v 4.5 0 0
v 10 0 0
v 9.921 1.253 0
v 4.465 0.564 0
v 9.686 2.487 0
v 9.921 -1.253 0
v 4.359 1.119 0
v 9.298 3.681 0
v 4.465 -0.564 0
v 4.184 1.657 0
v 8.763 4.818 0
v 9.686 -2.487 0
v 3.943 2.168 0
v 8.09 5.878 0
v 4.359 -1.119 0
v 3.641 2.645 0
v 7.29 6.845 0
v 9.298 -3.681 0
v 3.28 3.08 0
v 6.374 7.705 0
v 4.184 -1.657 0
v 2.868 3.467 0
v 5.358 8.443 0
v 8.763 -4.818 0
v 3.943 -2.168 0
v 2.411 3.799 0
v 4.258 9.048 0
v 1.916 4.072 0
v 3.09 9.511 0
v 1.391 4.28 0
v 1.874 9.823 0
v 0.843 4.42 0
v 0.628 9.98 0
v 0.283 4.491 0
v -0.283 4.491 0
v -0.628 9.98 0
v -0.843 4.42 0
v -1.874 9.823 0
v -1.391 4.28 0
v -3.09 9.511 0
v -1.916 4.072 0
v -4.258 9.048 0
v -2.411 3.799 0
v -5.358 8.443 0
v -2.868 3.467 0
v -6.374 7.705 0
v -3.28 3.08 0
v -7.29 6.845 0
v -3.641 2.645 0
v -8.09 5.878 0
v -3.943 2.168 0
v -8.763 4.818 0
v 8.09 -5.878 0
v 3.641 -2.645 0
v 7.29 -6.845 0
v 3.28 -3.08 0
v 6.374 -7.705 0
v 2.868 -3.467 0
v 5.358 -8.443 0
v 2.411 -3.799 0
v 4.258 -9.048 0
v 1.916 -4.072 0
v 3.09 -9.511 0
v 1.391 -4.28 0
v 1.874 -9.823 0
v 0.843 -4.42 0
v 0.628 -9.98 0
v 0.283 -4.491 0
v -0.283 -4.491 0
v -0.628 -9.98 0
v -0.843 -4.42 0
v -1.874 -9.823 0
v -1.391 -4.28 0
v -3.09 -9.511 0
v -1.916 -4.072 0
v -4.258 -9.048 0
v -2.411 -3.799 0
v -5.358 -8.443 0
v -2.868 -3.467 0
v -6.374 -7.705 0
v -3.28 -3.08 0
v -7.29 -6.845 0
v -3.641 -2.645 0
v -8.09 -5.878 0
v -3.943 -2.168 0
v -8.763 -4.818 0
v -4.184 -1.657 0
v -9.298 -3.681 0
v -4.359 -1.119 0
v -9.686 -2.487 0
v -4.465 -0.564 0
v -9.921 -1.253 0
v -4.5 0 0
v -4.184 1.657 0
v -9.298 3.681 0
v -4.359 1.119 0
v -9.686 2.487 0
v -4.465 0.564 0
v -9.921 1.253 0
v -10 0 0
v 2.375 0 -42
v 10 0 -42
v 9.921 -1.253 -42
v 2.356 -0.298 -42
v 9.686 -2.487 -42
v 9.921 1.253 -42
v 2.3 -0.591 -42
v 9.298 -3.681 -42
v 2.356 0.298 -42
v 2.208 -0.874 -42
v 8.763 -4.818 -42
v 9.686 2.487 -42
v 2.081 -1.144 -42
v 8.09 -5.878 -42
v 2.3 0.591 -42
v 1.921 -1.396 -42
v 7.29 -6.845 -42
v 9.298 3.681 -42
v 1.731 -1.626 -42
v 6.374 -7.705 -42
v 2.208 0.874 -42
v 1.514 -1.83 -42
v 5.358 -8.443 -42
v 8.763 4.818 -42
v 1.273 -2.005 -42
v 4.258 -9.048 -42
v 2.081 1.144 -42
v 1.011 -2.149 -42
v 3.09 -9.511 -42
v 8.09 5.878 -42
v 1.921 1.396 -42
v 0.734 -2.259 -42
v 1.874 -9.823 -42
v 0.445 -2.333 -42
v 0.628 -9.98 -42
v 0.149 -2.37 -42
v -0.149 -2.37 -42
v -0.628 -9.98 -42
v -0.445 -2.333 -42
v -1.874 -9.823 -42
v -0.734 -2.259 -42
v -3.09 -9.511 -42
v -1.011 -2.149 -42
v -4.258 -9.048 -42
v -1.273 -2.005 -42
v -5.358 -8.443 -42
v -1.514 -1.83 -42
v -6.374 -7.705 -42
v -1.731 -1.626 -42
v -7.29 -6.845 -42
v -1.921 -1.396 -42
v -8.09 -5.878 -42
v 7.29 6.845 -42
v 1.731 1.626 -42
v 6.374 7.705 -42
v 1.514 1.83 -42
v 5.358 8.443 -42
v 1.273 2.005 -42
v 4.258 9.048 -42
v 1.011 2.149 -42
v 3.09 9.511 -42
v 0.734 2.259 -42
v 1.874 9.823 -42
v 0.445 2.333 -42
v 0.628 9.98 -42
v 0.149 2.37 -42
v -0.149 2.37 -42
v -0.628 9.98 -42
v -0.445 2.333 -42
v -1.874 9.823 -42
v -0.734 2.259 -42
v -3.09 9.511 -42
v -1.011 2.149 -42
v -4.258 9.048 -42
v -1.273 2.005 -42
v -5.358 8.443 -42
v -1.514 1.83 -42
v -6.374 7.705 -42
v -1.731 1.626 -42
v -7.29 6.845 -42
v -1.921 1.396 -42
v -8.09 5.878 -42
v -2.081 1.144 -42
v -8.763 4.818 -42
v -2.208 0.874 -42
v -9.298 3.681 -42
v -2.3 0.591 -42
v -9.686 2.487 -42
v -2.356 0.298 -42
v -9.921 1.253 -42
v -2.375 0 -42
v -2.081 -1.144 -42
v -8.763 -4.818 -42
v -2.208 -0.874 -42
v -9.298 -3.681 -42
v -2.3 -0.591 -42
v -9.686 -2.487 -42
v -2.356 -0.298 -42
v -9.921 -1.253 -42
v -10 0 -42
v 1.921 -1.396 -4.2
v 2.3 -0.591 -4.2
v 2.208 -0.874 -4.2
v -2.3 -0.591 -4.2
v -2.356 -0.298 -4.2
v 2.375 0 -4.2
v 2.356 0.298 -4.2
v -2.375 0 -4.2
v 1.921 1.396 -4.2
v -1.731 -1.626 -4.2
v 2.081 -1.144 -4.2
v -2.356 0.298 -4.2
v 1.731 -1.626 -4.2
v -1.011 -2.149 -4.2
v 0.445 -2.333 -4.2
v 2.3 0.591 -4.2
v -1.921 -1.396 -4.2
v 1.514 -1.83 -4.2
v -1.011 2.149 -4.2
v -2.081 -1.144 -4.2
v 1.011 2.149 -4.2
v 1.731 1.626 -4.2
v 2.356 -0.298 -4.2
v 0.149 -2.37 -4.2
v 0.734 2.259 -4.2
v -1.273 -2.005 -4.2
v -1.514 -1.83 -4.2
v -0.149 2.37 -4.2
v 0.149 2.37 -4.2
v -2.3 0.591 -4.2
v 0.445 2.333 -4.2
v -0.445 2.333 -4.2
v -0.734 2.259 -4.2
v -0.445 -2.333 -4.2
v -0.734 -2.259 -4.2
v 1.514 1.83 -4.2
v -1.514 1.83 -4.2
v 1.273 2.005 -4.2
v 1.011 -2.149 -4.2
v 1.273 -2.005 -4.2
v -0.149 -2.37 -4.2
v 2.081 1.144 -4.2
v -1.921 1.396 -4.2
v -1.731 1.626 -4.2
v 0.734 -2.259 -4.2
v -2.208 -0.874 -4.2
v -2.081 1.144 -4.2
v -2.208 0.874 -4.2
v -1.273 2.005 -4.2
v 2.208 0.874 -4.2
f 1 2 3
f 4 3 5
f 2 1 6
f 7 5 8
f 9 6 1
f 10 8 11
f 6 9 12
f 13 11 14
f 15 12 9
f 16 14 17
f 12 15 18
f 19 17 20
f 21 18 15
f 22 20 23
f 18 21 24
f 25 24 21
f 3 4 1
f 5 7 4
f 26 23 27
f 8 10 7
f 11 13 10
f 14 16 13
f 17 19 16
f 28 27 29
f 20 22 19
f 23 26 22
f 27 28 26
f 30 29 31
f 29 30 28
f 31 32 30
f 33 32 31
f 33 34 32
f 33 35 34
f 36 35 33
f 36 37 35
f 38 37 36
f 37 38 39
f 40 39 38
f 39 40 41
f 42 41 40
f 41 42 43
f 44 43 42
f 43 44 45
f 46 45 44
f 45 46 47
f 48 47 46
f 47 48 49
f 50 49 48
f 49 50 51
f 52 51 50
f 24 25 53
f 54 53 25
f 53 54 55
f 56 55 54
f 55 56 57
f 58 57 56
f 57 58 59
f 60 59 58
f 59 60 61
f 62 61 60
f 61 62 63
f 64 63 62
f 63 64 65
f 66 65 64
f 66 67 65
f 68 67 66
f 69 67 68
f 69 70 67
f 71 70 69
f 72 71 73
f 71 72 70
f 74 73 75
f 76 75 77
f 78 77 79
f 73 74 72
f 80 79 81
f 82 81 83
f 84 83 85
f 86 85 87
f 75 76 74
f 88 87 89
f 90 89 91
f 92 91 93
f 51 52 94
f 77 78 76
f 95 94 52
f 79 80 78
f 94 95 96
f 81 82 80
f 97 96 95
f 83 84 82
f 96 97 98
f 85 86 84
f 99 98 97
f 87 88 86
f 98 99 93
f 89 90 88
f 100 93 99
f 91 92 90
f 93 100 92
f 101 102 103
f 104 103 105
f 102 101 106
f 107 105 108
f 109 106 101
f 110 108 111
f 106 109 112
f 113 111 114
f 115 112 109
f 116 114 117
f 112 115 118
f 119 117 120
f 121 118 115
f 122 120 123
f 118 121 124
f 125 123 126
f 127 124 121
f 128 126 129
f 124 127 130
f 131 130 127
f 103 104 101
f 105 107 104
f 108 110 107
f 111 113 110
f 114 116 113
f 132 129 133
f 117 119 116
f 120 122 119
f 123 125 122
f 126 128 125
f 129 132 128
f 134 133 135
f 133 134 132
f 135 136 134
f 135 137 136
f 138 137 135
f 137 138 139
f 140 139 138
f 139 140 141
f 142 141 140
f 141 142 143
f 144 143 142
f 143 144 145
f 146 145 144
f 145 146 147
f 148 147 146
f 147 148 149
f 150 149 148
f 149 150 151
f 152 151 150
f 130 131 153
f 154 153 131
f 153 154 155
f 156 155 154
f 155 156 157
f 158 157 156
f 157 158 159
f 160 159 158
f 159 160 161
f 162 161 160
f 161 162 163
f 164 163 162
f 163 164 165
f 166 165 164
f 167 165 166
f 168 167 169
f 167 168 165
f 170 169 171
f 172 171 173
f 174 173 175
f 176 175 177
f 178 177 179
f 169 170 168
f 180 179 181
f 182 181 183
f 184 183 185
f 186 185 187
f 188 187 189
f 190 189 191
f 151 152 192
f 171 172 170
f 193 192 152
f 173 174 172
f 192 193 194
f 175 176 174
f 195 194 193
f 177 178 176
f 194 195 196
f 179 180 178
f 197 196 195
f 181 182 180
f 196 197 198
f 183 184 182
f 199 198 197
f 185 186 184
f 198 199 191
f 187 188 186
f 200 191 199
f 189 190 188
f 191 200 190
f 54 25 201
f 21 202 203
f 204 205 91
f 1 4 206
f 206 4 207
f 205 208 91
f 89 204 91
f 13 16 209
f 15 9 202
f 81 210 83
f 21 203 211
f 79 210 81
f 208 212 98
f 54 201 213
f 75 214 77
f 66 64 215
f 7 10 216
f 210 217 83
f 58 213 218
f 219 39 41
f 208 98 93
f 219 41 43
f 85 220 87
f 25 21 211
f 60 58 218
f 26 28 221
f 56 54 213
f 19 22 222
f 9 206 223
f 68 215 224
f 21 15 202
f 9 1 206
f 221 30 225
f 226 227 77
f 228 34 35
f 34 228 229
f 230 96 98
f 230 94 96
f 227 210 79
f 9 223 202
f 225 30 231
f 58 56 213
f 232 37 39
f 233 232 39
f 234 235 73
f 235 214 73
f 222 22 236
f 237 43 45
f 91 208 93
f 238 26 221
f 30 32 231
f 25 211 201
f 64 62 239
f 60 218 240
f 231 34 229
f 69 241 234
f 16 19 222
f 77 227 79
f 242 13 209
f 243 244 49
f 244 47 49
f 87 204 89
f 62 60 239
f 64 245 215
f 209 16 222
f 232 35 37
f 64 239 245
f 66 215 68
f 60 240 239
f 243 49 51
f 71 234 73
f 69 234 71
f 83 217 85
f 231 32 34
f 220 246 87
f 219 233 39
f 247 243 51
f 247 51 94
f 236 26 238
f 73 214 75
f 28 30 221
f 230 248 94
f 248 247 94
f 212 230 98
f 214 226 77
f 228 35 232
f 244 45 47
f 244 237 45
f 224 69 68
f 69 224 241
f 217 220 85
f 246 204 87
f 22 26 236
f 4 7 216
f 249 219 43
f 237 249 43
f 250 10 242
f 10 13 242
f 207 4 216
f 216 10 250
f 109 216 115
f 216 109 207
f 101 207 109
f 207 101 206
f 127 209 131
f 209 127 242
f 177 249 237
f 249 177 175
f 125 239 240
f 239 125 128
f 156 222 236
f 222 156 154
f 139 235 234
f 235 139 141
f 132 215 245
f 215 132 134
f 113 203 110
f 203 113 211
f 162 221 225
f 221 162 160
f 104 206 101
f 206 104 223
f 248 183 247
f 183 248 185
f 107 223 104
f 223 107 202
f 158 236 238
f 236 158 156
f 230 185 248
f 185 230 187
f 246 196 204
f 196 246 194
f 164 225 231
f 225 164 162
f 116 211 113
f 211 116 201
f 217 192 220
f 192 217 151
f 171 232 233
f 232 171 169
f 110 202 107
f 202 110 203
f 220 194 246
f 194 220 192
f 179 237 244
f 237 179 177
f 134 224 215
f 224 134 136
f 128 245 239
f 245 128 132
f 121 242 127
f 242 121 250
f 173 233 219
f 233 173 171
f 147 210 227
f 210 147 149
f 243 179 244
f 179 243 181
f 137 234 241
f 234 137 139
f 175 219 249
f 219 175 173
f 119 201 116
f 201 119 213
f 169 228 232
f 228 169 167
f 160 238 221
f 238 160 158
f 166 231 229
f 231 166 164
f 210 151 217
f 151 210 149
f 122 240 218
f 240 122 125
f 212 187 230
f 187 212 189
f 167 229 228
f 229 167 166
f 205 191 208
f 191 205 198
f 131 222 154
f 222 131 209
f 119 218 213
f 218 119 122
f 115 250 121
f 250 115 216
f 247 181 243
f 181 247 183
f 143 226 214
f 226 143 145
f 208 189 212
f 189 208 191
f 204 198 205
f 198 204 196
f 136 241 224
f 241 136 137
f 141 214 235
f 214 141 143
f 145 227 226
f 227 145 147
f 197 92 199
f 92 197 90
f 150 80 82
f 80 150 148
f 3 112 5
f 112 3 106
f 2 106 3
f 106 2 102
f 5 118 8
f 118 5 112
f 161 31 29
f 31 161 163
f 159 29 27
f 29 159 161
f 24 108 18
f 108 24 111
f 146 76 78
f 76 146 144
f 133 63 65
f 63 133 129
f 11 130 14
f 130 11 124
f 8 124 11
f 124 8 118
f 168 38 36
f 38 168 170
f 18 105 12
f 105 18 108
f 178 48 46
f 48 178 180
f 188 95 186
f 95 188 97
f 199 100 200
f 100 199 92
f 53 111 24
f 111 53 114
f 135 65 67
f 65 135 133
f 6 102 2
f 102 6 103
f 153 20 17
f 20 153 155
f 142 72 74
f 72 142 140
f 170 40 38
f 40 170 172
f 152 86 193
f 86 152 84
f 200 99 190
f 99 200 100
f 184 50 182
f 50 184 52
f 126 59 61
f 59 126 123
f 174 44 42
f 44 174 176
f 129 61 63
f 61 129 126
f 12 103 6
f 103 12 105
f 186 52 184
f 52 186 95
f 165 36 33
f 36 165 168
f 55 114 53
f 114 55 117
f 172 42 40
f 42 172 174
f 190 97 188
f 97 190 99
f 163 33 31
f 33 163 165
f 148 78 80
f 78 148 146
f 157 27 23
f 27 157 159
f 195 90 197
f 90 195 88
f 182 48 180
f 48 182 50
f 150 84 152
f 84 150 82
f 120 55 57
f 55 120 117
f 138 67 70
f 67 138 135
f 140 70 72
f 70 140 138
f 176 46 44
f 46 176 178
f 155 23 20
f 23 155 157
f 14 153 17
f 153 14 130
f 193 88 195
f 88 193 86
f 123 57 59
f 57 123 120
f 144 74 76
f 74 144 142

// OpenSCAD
$fn = 50;


difference() {
	union() {
		translate(v = [0, 0, -42.0000000000]) {
			cylinder(h = 42, r = 10.0000000000);
		}
		cylinder(h = 0, r = 20.0000000000);
	}
	union() {
		translate(v = [0, 0, 0]) {
			rotate(a = [0, 0, 0]) {
				difference() {
					union() {
						#translate(v = [0, 0, -42.0000000000]) {
							cylinder(h = 42, r = 2.2500000000);
						}
						#translate(v = [0, 0, -4.2000000000]) {
							cylinder(h = 4.2000000000, r1 = 2.3750000000, r2 = 4.5000000000);
						}
						#translate(v = [0, 0, -42.0000000000]) {
							cylinder(h = 42, r = 2.3750000000);
						}
						#translate(v = [0, 0, -42.0000000000]) {
							cylinder(h = 42, r = 2.2500000000);
						}
					}
					union();
				}
			}
		}
	}
}
